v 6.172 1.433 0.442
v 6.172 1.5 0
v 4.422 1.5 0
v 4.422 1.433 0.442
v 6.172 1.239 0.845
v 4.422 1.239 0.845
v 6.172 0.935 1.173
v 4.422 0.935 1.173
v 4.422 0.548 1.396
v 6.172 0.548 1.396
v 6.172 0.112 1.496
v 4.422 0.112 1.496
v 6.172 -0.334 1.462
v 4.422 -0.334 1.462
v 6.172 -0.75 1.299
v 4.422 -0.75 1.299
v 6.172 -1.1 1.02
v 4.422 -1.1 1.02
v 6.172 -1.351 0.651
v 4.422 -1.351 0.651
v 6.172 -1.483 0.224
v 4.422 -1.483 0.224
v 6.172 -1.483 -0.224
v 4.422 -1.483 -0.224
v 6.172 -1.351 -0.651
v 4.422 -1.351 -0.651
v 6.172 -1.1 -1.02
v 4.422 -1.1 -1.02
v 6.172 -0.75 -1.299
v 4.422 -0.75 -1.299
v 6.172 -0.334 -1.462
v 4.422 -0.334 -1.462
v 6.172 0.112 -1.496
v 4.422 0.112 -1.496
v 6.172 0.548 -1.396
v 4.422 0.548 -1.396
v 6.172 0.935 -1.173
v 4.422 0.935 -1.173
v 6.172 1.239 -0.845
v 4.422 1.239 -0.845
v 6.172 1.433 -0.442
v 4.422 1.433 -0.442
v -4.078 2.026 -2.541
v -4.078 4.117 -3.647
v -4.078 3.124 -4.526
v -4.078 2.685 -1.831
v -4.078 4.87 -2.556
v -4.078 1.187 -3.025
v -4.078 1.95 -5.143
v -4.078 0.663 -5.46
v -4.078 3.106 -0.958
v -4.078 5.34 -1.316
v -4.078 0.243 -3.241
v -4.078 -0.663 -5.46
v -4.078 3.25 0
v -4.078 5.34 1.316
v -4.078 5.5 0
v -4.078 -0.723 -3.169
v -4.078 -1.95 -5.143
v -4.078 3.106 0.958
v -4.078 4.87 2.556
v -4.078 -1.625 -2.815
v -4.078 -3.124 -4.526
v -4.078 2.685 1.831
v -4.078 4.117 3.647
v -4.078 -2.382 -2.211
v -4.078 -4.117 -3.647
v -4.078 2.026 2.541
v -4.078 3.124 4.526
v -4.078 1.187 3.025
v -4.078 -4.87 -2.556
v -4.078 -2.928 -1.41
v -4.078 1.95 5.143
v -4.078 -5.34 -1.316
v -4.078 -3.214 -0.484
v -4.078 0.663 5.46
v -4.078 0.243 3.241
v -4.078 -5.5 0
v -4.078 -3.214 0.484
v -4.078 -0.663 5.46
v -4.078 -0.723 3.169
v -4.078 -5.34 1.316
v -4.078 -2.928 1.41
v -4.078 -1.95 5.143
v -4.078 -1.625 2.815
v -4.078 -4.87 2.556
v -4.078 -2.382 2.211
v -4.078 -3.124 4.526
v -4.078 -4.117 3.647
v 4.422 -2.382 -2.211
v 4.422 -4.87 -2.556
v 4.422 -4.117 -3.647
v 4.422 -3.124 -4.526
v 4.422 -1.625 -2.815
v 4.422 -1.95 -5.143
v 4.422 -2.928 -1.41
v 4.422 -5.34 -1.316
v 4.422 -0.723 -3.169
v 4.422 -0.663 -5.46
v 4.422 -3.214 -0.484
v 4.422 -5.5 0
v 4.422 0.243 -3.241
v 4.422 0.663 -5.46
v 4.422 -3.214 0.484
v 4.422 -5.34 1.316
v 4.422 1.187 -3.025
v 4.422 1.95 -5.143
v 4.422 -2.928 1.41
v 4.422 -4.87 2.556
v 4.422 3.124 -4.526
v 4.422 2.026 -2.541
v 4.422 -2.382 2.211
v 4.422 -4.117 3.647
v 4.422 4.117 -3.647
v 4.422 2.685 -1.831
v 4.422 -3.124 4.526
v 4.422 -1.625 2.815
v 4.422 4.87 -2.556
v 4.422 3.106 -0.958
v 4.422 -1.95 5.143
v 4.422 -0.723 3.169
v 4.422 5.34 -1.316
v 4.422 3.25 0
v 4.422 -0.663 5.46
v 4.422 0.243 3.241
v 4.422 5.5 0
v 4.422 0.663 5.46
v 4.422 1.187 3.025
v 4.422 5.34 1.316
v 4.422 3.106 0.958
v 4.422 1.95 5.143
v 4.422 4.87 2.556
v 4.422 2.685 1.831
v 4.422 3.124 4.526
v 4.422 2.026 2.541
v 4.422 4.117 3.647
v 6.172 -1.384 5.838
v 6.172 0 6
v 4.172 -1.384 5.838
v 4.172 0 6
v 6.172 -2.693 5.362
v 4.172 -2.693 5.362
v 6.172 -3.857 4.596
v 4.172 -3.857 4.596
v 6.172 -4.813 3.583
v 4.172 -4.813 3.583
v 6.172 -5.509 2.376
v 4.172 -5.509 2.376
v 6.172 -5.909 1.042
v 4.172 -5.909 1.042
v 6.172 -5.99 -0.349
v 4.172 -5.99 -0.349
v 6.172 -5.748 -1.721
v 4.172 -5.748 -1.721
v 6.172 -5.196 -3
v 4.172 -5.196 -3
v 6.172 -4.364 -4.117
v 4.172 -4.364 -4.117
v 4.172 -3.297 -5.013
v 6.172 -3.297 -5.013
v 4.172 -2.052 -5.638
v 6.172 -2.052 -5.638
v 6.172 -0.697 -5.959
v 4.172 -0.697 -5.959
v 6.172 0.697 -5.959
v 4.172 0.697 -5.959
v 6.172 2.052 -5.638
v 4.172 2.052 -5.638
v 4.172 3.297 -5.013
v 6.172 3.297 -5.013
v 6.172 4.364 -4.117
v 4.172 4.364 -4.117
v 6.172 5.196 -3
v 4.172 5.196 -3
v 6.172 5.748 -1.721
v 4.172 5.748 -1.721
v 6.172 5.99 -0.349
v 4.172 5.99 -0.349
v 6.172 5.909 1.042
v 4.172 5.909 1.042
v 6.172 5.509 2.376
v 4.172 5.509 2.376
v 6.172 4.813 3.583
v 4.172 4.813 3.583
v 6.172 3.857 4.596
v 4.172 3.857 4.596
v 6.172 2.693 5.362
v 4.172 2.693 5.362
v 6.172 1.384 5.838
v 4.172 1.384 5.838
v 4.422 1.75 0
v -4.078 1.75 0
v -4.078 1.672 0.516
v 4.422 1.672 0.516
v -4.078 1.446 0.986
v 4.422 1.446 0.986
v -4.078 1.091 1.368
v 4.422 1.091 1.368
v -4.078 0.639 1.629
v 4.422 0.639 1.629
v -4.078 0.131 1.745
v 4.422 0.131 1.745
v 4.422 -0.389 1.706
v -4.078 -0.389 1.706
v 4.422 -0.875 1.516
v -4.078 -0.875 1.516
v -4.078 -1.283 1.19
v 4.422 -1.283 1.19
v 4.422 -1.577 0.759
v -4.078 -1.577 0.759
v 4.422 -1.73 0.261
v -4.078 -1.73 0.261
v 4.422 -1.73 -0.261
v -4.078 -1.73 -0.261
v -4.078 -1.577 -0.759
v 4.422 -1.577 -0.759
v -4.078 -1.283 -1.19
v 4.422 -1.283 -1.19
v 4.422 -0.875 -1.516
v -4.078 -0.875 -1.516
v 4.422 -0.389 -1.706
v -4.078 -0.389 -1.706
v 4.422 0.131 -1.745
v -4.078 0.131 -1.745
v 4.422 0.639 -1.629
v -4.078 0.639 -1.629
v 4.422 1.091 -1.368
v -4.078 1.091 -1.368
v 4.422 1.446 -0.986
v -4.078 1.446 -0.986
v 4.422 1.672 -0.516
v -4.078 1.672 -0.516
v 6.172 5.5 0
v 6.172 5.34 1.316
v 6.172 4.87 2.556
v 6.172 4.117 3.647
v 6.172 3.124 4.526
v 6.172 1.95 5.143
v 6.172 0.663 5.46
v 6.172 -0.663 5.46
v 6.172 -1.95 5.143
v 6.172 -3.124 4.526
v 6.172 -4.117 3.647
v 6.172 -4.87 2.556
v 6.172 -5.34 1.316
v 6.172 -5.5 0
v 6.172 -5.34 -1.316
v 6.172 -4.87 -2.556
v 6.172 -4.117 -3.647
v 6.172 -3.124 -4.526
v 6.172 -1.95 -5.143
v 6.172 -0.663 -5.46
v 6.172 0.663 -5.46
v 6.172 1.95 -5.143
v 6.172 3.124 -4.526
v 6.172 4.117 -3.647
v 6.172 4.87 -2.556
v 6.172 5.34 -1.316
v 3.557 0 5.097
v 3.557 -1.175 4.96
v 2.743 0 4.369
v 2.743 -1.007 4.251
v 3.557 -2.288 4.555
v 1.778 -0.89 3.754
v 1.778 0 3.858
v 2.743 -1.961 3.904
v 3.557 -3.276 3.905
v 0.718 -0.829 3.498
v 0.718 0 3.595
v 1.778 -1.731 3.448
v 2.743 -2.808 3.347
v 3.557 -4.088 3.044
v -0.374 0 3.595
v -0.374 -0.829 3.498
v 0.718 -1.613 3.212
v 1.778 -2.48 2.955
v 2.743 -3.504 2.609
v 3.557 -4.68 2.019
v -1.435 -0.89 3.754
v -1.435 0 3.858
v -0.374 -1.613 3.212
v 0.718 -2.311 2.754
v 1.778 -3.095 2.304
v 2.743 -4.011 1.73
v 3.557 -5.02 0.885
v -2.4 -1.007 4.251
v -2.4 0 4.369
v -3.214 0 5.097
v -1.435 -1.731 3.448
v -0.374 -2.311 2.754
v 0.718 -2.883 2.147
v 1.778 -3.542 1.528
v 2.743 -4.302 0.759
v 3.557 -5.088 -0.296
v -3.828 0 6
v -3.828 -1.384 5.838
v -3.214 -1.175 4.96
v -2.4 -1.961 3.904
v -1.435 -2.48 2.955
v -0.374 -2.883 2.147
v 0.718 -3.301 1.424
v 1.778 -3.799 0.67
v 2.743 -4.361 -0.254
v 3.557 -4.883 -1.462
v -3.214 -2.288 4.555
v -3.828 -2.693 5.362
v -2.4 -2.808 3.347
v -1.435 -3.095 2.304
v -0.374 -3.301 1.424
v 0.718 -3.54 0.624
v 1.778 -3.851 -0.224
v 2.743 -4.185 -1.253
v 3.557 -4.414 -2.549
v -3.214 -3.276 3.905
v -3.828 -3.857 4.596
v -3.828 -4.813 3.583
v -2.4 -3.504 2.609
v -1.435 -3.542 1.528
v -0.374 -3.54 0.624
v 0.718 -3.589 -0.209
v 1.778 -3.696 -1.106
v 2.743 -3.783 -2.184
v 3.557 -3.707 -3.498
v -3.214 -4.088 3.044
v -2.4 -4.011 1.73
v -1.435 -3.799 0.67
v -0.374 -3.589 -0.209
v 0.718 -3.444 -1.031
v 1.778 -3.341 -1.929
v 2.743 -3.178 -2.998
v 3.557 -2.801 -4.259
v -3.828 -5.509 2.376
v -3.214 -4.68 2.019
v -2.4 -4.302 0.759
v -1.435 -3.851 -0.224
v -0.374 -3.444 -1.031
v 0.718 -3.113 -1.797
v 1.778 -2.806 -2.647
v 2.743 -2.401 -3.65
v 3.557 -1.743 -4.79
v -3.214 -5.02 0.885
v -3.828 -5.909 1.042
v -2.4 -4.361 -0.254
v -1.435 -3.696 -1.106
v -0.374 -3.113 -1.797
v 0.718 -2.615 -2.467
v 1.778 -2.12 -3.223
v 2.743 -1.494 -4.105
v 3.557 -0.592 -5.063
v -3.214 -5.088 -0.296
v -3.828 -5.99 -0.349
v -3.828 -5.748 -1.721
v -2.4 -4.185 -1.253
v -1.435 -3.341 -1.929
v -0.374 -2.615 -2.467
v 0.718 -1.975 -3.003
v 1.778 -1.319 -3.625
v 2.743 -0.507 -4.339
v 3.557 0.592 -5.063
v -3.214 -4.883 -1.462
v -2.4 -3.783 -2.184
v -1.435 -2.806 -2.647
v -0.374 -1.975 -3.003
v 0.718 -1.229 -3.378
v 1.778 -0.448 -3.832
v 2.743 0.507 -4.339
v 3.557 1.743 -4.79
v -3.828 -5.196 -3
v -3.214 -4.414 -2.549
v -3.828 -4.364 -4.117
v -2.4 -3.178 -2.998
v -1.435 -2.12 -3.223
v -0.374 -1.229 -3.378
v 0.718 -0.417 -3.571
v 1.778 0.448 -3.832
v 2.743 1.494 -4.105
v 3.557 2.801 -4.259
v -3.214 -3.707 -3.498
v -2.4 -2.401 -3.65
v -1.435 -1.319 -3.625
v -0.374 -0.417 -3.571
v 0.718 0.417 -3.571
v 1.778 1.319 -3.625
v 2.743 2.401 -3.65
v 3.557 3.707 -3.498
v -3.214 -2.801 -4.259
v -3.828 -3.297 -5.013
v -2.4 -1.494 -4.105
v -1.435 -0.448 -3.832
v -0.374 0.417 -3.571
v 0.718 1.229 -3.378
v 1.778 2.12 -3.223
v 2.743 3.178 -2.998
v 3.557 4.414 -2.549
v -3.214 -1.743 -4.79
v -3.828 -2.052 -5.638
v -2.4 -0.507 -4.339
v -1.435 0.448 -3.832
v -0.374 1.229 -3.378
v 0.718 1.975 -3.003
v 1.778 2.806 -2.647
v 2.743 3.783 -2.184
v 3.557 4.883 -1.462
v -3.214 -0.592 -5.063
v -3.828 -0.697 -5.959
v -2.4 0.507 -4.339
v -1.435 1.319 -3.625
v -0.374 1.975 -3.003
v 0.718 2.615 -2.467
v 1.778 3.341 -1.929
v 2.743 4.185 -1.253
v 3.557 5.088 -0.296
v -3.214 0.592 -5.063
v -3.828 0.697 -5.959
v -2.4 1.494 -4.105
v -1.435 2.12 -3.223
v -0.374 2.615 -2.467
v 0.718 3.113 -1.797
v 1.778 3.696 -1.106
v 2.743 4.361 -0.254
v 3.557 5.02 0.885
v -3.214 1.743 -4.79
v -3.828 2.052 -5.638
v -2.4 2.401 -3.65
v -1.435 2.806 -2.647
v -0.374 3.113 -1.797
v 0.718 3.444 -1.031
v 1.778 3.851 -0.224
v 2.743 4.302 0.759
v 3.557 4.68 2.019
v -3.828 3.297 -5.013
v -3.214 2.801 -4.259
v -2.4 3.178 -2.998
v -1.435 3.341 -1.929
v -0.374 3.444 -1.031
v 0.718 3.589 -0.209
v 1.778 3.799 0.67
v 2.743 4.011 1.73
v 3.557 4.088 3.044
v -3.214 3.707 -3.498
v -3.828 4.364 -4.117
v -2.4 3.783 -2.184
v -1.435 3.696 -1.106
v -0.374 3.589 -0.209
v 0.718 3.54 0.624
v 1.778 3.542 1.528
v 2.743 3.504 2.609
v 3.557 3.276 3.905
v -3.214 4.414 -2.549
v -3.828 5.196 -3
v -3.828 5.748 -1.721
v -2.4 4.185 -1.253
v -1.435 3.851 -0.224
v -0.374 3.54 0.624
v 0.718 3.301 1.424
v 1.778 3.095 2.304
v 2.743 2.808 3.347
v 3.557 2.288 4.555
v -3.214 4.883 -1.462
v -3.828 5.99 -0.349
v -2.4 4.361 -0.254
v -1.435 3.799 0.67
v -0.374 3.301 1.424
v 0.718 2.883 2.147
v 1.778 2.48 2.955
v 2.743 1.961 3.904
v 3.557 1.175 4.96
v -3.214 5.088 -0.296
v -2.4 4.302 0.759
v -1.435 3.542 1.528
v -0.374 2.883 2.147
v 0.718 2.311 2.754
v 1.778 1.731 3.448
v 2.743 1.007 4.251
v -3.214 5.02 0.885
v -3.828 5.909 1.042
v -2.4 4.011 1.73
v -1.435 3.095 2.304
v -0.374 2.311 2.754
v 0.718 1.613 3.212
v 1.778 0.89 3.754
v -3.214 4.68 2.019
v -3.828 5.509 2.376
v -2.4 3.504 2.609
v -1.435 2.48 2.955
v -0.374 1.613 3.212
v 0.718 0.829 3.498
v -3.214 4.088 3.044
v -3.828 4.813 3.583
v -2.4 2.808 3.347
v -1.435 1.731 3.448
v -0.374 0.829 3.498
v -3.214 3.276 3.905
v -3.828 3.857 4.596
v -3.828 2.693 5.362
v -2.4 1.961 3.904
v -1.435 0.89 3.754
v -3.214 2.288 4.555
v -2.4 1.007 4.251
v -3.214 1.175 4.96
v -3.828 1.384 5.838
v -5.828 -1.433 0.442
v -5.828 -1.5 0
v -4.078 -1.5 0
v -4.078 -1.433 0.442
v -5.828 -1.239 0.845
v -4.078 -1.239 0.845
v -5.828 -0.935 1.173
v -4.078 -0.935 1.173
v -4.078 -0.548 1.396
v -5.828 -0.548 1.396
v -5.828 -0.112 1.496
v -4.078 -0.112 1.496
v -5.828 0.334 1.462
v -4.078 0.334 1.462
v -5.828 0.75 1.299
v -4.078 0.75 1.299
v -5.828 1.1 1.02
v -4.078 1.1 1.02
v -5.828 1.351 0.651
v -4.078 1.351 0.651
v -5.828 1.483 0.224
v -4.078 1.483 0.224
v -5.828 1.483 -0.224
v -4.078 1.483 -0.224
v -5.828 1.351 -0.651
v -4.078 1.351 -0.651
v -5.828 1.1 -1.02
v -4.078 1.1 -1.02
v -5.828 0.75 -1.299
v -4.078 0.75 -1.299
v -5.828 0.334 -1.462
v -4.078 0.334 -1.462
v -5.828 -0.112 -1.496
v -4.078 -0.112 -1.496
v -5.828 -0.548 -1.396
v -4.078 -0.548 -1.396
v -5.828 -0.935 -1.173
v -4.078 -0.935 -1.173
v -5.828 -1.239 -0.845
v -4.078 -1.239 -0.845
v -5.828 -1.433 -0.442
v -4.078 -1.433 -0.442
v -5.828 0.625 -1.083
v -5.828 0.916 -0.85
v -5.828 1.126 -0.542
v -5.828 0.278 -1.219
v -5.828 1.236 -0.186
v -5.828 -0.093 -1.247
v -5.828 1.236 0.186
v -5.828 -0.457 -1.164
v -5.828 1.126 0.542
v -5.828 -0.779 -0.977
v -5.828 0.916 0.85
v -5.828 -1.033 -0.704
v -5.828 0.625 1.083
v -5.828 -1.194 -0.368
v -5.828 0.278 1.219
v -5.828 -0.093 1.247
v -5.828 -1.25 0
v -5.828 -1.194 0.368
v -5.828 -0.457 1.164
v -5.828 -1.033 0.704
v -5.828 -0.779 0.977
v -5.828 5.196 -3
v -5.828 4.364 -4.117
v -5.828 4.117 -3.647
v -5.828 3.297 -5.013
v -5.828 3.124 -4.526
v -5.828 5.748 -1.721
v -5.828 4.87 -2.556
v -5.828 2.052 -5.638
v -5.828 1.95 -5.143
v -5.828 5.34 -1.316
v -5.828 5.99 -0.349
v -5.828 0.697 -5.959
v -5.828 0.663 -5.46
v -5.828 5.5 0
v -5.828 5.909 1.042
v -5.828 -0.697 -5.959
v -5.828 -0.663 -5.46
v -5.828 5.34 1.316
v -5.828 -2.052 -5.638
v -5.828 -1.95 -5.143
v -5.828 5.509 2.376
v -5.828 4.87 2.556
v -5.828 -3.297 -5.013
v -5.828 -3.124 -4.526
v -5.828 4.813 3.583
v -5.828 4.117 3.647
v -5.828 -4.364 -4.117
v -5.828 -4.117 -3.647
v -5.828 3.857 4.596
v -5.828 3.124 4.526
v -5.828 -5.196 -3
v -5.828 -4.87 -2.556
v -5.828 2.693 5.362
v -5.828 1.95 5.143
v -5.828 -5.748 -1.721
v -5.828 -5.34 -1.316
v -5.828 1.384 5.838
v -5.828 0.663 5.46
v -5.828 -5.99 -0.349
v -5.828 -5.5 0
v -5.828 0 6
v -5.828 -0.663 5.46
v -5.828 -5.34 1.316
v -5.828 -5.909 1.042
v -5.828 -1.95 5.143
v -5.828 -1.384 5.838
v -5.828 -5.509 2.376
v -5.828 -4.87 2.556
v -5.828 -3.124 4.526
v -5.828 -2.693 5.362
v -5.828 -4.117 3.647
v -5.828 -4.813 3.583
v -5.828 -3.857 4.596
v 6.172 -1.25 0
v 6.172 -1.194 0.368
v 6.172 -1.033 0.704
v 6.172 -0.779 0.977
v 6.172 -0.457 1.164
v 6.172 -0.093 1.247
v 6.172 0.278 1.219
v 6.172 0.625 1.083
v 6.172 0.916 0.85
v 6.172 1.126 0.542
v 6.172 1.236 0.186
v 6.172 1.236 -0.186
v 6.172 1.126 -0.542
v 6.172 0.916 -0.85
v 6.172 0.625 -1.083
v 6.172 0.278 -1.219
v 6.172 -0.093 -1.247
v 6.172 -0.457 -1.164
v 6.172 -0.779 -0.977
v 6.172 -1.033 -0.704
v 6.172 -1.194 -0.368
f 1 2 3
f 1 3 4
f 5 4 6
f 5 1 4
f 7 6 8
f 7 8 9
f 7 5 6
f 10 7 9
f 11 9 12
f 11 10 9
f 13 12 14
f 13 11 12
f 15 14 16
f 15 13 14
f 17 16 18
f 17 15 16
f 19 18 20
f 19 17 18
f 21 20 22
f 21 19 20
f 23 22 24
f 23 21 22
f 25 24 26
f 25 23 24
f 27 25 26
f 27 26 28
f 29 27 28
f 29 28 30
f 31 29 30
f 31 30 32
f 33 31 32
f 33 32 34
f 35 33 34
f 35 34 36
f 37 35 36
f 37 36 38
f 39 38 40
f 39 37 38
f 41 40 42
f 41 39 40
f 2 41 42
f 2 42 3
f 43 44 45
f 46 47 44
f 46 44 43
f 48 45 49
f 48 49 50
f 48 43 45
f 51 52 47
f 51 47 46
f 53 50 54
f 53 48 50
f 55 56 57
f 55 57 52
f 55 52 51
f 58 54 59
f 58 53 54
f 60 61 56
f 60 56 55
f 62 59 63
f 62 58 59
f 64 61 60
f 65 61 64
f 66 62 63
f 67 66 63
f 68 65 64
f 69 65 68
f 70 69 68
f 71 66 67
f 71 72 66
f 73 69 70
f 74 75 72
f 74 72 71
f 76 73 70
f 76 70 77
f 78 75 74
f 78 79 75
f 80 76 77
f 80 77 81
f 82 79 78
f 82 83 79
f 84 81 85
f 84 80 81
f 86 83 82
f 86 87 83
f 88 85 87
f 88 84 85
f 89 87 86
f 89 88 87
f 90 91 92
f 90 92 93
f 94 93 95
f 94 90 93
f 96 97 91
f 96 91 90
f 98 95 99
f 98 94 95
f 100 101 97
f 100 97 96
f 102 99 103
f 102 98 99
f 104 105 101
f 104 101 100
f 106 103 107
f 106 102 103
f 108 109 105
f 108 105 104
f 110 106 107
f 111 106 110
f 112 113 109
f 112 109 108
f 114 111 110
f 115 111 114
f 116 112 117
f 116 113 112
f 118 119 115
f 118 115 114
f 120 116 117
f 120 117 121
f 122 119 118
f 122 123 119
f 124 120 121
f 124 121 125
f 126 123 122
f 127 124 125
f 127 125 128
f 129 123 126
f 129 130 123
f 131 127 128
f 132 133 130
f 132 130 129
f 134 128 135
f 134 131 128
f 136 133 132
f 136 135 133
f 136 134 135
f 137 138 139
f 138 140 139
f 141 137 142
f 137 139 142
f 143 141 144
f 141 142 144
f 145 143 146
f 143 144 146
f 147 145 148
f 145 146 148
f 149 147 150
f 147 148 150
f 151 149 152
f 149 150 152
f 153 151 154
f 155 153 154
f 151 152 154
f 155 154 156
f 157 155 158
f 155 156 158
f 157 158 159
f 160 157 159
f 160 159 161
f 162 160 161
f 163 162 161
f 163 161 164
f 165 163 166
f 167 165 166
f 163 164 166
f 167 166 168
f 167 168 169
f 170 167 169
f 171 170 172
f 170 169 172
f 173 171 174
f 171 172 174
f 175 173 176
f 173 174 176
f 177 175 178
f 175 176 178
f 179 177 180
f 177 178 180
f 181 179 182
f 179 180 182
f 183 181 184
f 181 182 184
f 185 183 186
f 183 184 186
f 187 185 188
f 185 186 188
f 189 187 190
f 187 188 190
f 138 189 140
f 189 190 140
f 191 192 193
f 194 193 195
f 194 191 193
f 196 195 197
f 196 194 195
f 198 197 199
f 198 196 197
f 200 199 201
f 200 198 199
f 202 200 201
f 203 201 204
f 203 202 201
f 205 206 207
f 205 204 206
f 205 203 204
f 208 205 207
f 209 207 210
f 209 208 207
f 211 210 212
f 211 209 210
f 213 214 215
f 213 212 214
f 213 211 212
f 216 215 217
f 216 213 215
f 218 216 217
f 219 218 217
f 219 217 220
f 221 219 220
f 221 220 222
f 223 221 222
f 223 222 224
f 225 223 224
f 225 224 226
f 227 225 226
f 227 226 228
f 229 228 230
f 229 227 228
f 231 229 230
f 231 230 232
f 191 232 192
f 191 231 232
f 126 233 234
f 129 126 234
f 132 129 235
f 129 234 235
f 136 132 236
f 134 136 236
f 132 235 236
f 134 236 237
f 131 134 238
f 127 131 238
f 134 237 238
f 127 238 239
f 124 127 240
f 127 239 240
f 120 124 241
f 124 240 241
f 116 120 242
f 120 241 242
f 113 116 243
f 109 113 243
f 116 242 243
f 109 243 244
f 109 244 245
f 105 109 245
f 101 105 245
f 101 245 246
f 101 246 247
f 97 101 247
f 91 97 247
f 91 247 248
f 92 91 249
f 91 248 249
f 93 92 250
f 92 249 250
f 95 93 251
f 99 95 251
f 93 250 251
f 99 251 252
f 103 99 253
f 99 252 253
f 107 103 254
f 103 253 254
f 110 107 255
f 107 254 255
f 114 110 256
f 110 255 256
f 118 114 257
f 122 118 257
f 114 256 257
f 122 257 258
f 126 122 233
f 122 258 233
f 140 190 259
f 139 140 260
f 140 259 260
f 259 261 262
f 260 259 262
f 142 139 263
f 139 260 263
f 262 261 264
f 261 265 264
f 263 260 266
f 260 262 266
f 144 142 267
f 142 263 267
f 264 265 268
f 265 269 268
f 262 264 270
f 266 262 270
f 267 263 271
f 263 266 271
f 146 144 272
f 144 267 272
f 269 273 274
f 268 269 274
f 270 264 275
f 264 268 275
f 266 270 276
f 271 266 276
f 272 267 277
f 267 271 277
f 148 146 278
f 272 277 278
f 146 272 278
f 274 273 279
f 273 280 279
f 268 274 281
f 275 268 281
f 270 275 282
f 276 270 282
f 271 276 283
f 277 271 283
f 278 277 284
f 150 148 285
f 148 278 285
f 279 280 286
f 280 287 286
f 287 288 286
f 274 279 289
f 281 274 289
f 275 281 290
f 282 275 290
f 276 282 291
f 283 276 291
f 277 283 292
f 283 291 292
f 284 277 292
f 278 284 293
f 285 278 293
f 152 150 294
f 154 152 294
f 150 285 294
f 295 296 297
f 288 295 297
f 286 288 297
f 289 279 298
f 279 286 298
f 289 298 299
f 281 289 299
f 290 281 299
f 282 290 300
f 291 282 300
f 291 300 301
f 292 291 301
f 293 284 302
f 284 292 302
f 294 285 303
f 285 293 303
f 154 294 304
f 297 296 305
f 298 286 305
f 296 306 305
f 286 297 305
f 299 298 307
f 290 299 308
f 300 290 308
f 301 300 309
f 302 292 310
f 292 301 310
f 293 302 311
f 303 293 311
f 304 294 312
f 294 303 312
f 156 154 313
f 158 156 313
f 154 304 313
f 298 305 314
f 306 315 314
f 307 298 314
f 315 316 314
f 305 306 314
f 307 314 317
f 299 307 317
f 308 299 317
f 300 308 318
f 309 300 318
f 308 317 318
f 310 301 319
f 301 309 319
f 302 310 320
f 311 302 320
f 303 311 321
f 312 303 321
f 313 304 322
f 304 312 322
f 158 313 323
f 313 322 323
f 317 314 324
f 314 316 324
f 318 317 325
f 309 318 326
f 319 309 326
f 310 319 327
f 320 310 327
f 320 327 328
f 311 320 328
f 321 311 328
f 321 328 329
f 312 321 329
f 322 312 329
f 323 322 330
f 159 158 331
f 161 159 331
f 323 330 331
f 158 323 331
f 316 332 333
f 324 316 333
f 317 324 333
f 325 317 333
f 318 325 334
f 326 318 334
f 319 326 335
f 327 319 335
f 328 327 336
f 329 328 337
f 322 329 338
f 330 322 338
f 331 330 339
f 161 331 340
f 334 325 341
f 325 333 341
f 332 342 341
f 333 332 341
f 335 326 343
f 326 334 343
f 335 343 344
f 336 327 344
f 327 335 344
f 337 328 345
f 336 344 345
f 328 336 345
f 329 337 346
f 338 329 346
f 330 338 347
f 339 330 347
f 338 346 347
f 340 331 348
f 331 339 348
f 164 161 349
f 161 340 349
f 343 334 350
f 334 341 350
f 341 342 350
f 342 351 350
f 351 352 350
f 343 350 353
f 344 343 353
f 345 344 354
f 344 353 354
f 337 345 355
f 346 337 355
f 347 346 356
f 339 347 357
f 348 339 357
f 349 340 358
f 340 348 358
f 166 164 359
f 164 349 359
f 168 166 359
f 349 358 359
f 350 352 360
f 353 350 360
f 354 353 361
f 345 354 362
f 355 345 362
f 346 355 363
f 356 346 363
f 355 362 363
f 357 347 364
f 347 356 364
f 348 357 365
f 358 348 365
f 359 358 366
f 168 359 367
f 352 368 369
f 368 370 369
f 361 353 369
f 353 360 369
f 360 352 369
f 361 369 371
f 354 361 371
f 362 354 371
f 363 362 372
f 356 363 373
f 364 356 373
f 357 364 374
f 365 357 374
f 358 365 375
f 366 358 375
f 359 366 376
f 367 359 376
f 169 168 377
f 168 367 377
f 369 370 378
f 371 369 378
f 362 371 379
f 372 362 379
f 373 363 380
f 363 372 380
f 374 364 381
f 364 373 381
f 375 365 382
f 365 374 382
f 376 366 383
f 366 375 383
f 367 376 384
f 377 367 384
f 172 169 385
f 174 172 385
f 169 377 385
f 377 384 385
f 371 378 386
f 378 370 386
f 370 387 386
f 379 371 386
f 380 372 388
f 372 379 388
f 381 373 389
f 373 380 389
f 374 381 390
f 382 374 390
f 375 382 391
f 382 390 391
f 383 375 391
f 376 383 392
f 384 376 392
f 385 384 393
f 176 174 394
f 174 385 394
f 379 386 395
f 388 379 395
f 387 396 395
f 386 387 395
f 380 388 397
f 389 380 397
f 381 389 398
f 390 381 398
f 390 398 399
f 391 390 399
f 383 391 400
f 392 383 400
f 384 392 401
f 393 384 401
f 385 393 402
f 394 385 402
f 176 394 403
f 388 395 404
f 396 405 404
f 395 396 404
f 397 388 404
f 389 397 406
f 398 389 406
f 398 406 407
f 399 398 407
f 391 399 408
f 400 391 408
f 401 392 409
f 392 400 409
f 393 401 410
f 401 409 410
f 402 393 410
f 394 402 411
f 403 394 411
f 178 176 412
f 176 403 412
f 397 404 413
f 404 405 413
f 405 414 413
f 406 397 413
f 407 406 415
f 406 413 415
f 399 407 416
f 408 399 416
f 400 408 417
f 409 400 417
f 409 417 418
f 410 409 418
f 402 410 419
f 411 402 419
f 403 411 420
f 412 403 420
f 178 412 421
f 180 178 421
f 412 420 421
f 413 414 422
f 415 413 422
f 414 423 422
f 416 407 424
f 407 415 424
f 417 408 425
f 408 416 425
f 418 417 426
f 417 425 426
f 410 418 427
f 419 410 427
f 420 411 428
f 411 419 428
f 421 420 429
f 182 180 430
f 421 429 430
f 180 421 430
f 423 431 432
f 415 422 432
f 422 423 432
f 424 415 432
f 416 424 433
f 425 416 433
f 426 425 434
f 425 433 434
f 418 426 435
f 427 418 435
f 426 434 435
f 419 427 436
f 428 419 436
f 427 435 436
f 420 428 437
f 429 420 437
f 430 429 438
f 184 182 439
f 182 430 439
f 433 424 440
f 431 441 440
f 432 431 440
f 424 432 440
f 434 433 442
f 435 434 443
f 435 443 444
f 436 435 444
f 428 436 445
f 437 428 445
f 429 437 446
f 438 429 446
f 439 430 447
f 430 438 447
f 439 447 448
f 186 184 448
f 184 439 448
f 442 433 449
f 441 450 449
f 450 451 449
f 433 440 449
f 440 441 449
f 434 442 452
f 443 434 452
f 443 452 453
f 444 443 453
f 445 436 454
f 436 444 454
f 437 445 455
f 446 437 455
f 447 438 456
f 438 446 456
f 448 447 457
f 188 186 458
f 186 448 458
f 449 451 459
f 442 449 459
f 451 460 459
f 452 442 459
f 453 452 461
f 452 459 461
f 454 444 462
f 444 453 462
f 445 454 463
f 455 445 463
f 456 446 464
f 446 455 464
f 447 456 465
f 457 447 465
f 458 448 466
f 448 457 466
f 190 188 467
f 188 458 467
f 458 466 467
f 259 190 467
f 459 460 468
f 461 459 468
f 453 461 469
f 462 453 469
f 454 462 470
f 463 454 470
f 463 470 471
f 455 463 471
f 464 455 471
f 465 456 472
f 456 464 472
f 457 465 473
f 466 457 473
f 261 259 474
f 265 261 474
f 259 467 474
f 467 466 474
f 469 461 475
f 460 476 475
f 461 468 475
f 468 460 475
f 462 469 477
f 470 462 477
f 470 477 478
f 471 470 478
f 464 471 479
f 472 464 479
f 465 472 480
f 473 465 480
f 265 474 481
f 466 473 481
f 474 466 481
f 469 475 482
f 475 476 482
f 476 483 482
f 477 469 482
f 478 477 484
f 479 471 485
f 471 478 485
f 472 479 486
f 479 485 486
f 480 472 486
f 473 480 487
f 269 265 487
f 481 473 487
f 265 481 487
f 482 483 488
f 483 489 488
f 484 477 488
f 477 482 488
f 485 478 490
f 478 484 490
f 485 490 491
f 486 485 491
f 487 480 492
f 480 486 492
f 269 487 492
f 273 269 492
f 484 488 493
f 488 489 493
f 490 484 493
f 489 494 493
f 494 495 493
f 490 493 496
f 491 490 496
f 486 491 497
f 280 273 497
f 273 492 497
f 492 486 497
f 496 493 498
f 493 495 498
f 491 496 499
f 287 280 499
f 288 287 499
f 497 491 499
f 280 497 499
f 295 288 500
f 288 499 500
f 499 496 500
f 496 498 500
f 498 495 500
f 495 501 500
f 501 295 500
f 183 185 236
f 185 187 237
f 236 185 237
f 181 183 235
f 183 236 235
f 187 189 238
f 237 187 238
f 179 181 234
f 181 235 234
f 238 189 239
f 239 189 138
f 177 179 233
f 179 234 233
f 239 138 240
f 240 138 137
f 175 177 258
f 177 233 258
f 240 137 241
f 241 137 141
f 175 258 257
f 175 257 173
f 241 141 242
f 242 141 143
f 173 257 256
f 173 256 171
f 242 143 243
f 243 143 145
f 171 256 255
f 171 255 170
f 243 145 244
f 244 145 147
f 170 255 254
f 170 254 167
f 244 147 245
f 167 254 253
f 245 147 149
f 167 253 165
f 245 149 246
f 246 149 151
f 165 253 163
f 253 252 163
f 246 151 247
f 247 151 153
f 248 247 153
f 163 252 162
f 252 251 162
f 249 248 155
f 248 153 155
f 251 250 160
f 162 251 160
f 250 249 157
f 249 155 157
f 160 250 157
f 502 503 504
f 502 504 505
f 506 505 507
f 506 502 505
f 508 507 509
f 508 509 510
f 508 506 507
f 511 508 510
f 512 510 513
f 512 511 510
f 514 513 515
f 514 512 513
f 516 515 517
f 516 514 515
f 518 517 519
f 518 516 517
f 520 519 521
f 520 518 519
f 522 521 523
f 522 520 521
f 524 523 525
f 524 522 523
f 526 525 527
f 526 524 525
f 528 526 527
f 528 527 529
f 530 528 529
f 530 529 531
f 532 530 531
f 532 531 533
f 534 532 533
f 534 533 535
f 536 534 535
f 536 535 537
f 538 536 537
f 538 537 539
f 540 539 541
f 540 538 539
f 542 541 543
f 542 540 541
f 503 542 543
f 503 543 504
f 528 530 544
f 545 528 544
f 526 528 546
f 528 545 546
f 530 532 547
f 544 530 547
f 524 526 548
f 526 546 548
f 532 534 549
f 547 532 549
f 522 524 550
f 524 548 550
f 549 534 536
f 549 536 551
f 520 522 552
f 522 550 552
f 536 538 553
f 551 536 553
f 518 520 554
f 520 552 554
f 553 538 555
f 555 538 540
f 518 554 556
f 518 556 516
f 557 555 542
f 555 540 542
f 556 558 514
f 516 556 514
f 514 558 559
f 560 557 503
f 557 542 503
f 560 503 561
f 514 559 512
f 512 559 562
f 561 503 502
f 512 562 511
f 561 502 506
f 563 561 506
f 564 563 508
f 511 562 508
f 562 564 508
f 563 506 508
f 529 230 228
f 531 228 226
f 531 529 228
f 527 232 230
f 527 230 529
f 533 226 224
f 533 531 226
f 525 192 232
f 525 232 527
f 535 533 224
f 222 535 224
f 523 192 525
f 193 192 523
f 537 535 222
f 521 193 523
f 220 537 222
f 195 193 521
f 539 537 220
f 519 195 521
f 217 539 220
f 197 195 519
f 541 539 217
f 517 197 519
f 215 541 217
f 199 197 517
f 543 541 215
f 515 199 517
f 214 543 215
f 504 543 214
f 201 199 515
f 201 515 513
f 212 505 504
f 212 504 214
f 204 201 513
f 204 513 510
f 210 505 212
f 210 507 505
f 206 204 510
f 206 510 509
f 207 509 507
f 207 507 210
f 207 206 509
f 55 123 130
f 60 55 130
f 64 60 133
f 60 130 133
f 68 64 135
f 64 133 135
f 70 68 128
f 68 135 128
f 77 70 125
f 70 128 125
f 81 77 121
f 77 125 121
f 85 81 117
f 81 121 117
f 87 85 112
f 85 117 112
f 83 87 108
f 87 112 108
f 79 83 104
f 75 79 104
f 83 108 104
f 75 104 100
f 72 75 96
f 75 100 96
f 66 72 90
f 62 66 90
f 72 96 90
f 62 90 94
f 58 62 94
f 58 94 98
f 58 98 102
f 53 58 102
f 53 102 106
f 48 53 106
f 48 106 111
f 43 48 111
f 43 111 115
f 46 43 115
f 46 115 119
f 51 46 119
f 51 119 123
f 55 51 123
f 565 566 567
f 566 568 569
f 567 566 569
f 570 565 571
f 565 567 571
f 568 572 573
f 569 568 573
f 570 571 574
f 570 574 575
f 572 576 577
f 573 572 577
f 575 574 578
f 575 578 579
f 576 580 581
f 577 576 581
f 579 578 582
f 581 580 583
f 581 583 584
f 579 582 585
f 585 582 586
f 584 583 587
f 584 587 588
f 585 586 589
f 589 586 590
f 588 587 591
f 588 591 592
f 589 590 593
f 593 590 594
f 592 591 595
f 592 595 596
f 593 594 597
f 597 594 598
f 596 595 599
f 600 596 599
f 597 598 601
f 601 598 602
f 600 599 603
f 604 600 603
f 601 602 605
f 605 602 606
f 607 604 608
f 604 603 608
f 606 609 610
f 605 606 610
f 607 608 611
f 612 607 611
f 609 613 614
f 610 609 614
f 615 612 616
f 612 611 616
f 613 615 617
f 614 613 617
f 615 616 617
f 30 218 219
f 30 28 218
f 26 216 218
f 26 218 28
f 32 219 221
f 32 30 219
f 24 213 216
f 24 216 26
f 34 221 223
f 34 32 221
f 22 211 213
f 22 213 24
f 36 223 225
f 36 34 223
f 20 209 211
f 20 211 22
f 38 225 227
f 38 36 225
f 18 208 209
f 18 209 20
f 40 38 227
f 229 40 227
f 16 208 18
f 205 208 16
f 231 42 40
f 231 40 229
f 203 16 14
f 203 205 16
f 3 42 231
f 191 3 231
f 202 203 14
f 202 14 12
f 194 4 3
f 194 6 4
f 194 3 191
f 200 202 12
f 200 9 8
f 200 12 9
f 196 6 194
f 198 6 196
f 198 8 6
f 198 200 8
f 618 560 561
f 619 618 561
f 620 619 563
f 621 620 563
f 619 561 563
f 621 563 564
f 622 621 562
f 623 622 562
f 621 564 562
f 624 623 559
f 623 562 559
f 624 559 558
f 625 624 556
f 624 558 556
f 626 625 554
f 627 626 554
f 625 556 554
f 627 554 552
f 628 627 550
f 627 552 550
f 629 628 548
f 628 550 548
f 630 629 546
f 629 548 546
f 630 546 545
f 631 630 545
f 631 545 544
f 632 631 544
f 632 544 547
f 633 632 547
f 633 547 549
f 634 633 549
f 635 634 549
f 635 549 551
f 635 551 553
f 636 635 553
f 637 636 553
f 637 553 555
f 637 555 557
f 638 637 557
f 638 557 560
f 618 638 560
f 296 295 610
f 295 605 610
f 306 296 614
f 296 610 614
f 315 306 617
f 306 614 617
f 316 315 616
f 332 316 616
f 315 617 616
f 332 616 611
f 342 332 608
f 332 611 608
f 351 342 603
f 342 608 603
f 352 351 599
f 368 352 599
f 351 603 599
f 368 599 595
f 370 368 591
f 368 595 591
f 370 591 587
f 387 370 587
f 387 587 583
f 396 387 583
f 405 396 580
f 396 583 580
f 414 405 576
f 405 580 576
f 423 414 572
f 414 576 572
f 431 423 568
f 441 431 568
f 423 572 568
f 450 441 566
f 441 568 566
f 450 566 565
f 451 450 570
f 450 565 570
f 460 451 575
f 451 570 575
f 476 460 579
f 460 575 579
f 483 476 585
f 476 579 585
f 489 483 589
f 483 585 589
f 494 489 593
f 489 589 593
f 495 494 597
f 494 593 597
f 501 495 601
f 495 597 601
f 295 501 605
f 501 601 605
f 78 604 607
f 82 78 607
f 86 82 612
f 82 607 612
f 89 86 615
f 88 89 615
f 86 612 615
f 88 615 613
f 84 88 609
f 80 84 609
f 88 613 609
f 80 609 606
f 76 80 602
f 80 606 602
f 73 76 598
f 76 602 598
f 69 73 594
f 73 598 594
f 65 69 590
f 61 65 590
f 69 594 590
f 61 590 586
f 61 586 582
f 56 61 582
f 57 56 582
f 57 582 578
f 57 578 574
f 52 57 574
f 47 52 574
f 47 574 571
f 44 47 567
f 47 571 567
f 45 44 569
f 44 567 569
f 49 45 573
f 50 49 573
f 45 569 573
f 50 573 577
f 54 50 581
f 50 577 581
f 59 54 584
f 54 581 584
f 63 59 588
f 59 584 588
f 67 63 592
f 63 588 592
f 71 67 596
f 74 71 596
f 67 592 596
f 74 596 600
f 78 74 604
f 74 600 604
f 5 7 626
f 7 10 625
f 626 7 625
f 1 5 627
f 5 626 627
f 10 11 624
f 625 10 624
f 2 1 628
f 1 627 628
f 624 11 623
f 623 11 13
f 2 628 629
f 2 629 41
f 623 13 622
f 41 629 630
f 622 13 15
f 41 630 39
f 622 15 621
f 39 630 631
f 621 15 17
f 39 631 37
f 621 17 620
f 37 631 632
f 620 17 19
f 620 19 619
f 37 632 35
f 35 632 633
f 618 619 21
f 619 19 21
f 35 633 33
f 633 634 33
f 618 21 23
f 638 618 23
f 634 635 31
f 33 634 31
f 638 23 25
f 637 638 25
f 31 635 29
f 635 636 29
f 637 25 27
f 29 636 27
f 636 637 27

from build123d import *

# Parameters (mm, degrees)
F2_R      = 1.25
F3_DEPTH  = 12.001
F4_R      = 5.5
F4_R_2    = 3.25
F5_DEPTH  = 1.75
F6_R      = 5.5
F6_R_2    = 3.25
F7_DEPTH  = 1.75
F4_R_3    = 1.75
F8_DEPTH  = 12.001
F4_R_4    = 1.5
F9_DEPTH  = 1.75
F10_R     = 1.75
F10_R_2   = 1.5
F11_DEPTH = 1.75


with BuildPart() as f1:
    # F0 (on Front) → F1 (revolve)
    with BuildSketch(Plane.XZ):
        with BuildLine():
            Line((-5.828382, 6), (-5.828382, 0))
            Line((-5.828382, 0), (6.171618, 0))
            Line((6.171618, 0), (6.171618, 6))
            Line((6.171618, 6), (4.171618, 6))
            ThreePointArc((4.171618, 6), (0.171618, 3.561553), (-3.828382, 6))
            Line((-3.828382, 6), (-5.828382, 6))
        make_face()
    revolve(axis=Axis((0.171618, 0, 0), (1, 0, 0)))

    # F2 (on face) → F3 (cut, through all)
    with BuildSketch(Plane(origin=(-5.828382, 0, 0), x_dir=(0, -1, 0), z_dir=(-1, 0, 0))):
        Circle(F2_R)
    extrude(amount=-F3_DEPTH, mode=Mode.SUBTRACT)

    # F4 (on face) → F5 (cut)
    with BuildSketch(Plane.YZ.offset(6.171618)):
        Circle(F4_R)
        Circle(F4_R_2, mode=Mode.SUBTRACT)
    extrude(amount=-F5_DEPTH, mode=Mode.SUBTRACT)

    # F6 (on face) → F7 (cut)
    with BuildSketch(Plane(origin=(-5.828382, 0, 0), x_dir=(0, -1, 0), z_dir=(-1, 0, 0))):
        Circle(F6_R)
        Circle(F6_R_2, mode=Mode.SUBTRACT)
    extrude(amount=-F7_DEPTH, mode=Mode.SUBTRACT)

    # F4 (on face) → F8 (cut, through all)
    with BuildSketch(Plane.YZ.offset(6.171618)):
        Circle(F4_R_2)
        Circle(F4_R_3, mode=Mode.SUBTRACT)
    extrude(amount=-F8_DEPTH, mode=Mode.SUBTRACT)

    # F4 (on face) → F9 (cut)
    with BuildSketch(Plane.YZ.offset(6.171618)):
        Circle(F4_R_3)
        Circle(F4_R_4, mode=Mode.SUBTRACT)
    extrude(amount=-F9_DEPTH, mode=Mode.SUBTRACT)

    # F10 (on face) → F11 (cut)
    with BuildSketch(Plane(origin=(-5.828382, 0, 0), x_dir=(0, -1, 0), z_dir=(-1, 0, 0))):
        Circle(F10_R)
        Circle(F10_R_2, mode=Mode.SUBTRACT)
    extrude(amount=-F11_DEPTH, mode=Mode.SUBTRACT)


solid = f1.part
